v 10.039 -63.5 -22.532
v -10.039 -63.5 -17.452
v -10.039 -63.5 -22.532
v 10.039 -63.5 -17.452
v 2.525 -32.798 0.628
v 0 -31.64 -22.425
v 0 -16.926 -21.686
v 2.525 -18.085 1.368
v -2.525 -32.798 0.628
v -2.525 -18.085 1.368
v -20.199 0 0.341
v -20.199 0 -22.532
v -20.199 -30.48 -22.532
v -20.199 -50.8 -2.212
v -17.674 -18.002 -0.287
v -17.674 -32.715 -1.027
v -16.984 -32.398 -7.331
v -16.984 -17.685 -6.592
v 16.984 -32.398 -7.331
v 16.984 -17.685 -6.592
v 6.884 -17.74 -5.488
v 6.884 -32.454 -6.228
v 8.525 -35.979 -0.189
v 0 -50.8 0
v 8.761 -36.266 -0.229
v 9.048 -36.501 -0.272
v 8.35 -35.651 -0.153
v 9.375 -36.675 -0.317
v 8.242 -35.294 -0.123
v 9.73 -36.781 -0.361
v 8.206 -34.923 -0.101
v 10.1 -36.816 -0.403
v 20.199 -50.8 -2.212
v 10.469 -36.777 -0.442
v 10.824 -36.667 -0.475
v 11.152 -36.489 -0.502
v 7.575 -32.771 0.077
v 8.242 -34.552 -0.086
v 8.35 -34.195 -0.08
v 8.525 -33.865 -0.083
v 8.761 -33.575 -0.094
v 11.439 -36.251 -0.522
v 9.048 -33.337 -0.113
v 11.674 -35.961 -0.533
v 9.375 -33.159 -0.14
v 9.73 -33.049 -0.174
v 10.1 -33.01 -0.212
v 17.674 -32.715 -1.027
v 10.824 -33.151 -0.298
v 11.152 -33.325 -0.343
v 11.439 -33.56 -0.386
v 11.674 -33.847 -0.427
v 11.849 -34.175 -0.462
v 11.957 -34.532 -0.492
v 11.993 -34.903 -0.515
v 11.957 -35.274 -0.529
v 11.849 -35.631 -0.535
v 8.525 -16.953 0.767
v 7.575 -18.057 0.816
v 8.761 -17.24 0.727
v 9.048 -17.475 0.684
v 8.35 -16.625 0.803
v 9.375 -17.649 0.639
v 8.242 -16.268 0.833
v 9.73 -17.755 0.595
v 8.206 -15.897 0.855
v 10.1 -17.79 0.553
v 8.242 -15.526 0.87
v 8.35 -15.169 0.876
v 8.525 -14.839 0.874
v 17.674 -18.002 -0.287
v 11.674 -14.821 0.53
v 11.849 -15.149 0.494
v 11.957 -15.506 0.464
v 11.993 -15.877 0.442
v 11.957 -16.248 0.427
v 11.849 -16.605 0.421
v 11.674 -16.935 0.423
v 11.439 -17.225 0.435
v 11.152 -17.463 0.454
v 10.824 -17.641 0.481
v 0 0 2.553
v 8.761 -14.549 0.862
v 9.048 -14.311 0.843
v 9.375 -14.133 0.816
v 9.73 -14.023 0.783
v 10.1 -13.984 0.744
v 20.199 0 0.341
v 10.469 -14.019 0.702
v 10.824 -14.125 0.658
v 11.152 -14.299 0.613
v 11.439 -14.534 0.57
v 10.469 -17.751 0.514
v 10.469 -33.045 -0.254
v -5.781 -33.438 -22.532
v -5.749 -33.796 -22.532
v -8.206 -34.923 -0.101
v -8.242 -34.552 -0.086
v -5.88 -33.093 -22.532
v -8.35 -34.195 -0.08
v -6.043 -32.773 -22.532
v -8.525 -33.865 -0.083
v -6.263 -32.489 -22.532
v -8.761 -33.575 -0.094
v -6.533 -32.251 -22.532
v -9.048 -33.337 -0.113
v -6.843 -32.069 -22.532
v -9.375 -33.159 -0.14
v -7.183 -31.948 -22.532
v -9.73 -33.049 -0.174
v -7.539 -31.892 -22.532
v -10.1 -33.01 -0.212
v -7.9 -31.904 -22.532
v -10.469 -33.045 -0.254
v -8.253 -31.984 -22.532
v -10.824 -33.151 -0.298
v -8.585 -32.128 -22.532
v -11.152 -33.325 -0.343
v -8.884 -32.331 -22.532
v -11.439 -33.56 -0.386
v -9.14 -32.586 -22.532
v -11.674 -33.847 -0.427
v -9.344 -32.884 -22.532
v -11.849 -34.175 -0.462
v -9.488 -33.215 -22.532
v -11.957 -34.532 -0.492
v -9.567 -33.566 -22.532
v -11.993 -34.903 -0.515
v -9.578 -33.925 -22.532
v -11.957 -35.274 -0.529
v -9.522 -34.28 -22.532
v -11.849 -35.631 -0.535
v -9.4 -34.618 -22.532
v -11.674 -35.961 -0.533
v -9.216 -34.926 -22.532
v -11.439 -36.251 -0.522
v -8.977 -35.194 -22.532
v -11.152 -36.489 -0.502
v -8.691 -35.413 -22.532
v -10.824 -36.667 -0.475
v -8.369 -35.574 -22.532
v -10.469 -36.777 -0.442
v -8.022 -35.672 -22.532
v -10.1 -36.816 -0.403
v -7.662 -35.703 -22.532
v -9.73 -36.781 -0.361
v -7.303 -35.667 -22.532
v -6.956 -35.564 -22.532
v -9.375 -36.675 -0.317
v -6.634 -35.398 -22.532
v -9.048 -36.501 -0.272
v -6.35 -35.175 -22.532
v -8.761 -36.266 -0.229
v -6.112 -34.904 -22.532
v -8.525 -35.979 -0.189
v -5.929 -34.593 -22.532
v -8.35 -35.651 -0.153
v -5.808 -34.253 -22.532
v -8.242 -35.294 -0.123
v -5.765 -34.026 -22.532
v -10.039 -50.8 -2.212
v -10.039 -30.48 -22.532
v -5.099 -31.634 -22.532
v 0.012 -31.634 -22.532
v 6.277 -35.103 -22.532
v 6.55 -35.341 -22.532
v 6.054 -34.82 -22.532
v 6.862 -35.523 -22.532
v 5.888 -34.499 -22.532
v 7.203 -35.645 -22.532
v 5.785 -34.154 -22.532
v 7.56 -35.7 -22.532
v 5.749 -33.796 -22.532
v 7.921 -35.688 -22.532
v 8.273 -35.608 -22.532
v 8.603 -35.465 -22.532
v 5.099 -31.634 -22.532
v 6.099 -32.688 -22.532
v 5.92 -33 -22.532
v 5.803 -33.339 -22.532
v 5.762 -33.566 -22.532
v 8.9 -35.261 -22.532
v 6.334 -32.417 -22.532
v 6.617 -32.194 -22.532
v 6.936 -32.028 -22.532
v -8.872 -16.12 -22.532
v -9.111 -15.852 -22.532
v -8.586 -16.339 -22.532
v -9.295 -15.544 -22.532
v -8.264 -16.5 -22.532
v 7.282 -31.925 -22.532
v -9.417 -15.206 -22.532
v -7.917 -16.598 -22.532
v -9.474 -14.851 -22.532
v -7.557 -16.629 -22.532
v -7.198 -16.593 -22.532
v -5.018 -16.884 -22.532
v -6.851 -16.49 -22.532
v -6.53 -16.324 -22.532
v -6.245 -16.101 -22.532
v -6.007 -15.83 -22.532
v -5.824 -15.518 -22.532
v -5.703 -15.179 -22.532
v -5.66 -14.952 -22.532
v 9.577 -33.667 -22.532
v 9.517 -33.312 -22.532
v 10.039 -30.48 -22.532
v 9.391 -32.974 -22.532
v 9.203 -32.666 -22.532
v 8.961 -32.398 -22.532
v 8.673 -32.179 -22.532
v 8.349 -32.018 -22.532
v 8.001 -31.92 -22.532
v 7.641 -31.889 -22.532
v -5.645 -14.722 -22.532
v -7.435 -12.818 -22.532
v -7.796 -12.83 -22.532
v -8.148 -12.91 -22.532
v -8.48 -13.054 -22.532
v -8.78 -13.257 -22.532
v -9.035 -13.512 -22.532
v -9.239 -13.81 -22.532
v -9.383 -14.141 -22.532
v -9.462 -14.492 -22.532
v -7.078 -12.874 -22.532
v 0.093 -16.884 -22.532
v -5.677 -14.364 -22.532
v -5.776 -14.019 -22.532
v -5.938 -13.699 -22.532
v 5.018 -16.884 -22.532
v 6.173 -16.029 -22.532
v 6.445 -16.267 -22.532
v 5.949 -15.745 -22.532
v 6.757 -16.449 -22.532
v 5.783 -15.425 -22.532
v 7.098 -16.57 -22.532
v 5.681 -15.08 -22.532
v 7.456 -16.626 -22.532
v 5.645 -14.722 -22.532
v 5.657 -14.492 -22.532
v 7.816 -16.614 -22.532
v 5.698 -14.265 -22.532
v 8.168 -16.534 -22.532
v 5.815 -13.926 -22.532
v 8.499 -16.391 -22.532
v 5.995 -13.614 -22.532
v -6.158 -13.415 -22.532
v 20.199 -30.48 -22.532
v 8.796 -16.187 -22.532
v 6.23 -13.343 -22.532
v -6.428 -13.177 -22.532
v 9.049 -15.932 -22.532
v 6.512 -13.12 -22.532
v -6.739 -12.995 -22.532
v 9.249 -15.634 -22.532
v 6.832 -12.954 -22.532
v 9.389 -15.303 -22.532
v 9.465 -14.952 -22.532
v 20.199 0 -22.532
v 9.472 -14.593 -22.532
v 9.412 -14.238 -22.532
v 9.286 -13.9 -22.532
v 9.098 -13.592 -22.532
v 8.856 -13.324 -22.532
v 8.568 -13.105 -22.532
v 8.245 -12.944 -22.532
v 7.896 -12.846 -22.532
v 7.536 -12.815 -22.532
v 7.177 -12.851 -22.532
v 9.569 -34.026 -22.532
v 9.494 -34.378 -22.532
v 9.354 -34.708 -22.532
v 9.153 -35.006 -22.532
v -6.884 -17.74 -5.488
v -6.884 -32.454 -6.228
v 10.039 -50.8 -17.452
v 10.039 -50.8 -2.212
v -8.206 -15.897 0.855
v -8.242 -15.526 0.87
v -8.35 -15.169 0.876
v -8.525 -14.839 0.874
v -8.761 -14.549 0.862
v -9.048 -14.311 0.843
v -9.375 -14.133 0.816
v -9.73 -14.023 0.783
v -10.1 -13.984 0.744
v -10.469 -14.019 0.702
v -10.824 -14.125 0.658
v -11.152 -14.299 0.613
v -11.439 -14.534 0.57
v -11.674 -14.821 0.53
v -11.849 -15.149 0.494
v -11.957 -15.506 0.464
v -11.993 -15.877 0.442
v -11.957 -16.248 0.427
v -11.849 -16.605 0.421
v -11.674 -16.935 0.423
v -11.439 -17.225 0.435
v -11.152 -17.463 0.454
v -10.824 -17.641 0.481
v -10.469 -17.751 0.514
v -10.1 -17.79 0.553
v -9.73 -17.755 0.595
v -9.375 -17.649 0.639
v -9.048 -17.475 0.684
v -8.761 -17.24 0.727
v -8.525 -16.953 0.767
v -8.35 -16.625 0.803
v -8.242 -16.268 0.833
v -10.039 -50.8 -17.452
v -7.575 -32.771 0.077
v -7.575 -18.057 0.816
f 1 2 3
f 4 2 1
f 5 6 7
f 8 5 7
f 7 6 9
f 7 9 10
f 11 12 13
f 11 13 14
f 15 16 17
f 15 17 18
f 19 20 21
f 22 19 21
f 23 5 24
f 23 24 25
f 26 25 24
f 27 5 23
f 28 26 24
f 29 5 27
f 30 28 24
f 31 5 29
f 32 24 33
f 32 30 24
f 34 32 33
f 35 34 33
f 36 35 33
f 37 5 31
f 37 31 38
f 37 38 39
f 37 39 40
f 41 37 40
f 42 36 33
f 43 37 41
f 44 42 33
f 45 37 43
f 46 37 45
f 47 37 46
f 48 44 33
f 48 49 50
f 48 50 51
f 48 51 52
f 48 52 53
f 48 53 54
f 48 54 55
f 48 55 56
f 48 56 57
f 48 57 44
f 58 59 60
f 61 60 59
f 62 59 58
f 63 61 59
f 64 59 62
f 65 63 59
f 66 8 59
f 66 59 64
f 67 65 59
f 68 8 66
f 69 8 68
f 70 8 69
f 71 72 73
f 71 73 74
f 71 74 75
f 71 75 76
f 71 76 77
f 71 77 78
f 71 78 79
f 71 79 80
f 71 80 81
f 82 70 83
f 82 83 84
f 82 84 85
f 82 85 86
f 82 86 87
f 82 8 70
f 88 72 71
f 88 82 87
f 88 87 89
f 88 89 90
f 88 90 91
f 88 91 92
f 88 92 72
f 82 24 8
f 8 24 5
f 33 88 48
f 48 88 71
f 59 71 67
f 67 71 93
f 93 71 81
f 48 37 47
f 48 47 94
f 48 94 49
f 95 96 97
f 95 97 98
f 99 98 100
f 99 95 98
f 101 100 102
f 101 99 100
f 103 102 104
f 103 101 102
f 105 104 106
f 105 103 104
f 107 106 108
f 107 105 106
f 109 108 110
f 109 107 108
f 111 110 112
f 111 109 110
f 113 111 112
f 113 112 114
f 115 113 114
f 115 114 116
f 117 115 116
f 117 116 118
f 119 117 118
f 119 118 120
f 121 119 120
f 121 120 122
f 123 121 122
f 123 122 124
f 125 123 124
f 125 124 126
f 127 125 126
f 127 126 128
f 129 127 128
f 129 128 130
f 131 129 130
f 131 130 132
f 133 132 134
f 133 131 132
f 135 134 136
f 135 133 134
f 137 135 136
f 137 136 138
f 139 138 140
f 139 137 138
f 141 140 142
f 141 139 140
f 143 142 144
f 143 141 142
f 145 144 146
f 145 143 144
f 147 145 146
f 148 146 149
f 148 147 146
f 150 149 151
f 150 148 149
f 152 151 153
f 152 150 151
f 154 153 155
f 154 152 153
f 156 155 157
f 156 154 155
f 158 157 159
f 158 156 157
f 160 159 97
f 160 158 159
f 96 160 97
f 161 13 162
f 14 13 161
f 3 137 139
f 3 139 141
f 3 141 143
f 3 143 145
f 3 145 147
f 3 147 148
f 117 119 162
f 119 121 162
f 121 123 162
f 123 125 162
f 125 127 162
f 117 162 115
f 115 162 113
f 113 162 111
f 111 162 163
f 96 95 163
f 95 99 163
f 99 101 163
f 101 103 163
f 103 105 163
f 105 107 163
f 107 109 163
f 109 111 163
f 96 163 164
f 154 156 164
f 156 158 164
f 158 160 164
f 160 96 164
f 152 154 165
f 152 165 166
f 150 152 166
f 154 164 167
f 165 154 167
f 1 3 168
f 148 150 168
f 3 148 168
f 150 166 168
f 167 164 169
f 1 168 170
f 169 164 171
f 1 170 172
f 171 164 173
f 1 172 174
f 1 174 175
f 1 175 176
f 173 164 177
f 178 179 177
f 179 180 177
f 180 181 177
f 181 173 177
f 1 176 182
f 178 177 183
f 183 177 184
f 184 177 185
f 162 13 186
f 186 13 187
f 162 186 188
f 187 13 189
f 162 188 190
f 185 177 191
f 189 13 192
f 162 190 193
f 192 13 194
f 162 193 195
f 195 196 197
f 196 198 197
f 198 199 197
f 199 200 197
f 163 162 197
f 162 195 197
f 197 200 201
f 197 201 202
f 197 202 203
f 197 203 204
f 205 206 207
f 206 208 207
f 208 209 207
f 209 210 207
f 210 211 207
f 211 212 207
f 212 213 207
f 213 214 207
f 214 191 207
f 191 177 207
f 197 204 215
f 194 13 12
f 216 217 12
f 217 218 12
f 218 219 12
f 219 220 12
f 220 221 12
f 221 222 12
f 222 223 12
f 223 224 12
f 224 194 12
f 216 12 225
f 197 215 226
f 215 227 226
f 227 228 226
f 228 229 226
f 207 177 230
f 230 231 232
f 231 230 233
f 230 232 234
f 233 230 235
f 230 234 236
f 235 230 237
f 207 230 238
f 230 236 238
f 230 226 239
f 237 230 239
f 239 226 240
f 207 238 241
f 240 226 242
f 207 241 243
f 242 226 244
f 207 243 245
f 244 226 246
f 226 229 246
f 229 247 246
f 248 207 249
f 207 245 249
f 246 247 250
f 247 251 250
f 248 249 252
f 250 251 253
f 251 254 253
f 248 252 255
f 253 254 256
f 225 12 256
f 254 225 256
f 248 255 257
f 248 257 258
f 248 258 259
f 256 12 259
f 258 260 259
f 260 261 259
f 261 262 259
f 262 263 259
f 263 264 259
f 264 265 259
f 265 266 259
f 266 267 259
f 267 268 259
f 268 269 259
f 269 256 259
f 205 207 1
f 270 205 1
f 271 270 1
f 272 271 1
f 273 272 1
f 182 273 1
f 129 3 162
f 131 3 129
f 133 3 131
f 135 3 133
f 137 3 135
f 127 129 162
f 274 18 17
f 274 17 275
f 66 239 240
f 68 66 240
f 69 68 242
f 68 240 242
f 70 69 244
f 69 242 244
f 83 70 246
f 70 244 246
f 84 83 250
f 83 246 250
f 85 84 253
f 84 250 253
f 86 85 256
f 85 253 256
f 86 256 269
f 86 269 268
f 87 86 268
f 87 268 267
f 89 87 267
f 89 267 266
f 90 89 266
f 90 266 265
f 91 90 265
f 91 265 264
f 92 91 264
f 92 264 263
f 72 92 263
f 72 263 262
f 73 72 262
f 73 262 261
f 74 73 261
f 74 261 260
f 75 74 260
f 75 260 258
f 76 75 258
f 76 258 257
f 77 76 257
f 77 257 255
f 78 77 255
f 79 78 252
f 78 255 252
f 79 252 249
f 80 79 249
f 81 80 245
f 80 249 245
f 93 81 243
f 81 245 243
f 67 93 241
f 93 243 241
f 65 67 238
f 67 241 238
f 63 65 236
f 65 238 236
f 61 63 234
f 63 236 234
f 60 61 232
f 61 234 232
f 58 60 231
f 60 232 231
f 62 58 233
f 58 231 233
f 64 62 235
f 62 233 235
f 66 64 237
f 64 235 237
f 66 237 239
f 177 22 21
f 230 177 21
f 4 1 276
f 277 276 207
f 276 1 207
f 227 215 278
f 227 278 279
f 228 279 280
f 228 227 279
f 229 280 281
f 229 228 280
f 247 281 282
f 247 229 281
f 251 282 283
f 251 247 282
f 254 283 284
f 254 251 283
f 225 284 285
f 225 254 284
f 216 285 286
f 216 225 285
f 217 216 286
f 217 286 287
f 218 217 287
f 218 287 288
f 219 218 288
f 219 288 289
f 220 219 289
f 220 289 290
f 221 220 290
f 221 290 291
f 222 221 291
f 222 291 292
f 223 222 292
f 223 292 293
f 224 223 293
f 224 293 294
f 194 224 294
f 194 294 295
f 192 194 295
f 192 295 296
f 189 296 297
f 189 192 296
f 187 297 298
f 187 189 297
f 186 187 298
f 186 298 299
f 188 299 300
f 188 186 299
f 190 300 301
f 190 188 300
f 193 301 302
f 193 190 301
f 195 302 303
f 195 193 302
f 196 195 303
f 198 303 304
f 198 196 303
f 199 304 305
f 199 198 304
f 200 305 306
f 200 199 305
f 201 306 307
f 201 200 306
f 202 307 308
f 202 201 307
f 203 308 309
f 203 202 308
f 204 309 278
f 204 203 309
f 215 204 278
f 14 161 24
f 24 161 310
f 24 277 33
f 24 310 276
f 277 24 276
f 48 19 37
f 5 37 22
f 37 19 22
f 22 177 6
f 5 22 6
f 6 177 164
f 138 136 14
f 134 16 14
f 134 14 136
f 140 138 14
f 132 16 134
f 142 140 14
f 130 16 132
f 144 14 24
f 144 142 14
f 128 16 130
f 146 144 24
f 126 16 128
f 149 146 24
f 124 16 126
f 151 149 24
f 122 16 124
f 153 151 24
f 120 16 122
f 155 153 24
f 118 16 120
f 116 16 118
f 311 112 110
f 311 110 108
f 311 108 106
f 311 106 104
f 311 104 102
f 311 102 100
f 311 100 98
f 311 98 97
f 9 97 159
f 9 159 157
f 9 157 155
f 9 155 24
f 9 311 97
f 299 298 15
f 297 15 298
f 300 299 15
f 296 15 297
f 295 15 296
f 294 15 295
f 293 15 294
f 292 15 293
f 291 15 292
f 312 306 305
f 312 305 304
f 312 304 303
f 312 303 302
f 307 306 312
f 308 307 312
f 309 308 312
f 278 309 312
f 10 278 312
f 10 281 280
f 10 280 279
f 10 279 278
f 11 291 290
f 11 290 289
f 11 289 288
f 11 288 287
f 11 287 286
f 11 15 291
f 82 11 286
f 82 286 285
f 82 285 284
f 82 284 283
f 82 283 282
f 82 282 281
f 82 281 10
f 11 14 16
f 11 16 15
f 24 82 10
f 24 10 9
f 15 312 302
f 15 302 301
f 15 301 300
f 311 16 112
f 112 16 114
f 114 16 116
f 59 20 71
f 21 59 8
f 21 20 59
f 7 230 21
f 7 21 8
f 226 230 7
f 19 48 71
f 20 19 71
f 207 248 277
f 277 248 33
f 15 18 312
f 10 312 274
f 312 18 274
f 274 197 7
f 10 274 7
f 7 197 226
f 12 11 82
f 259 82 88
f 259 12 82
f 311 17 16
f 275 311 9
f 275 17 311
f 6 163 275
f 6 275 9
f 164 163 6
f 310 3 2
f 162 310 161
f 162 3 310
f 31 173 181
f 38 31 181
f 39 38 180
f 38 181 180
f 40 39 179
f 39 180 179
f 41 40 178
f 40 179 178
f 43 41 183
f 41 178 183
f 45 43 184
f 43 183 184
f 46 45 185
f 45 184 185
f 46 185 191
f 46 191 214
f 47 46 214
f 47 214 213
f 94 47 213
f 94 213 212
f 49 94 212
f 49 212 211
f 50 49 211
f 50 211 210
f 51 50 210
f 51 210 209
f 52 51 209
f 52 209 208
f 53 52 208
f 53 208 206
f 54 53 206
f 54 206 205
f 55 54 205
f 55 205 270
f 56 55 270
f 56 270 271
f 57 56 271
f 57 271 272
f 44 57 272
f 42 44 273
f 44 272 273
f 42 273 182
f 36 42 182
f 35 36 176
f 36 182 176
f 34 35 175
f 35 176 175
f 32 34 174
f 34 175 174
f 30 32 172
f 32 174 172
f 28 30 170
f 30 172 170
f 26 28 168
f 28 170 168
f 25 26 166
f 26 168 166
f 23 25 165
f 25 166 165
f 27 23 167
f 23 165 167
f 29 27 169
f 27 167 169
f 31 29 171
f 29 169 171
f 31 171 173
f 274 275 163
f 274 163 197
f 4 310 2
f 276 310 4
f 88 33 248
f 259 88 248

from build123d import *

# Parameters (mm, degrees)
BOSS_EXTRUDE1_DEPTH = 50.8
DRAFT1_ANGLE        = 2.86
CUT_EXTRUDE1_DEPTH  = 10.16
SKETCH3_W           = 20.078449586
SKETCH3_H           = 5.08
BOSS_EXTRUDE2_DEPTH = 12.7
CUT_EXTRUDE2_START  = -28.101341283
SKETCH4_R           = 1.905
SKETCH4_W           = 5.08
SKETCH4_H           = 14.732
CUT_EXTRUDE2_DEPTH  = 34.466005054
SKETCH5_W           = 15.24
SKETCH5_H           = 14.732
CUT_EXTRUDE3_DEPTH  = 6.35


with BuildPart() as part:
    # Sketch1 → Boss-Extrude1 (new body)
    with BuildSketch(Plane(origin=(0, 0, 0), x_dir=(1, 0, 0), z_dir=(0, 1, 0))):
        Polygon((-20.199224793, 2.212174897), (0, 0), (20.199224793, 2.212174897), (20.199224793, 22.532174897), (-20.199224793, 22.532174897), align=None)
    extrude(amount=-BOSS_EXTRUDE1_DEPTH)

    # Draft1
    draft1_faces = [part.faces().sort_by_distance(p)[0] for p in [
        (10.099612396, -25.4, -1.106087448),
        (-10.099612396, -25.4, -1.106087448),
    ]]
    draft(draft1_faces, Plane(origin=(0, -50.8, 0), x_dir=(0, 0, -1), z_dir=(0, -1, 0)), DRAFT1_ANGLE)

    # Sketch2 → Cut-Extrude1 (cut)
    with BuildSketch(Plane.ZY.offset(20.199224793)):
        Polygon((-22.532174897, -30.48), (-2.212174897, -50.8), (-22.532174897, -50.8), align=None)
    cut_extrude1 = extrude(amount=-CUT_EXTRUDE1_DEPTH, mode=Mode.SUBTRACT)

    # Mirror1: Cut-Extrude1 across plane
    add(cut_extrude1.mirror(Plane.ZY), mode=Mode.SUBTRACT)

    # Sketch3 → Boss-Extrude2 (add)
    with BuildSketch(Plane.XZ.offset(50.8)):
        with Locations((0, -19.992174897)):
            Rectangle(SKETCH3_W, SKETCH3_H)
    extrude(amount=BOSS_EXTRUDE2_DEPTH)

    # Sketch4 → Cut-Extrude2 (cut)
    with BuildSketch(Plane(origin=(-0.275601276, -0.126470659, 2.516497283), x_dir=(0.99407118, -0.005457579, 0.108594221), z_dir=(-0.108731274, -0.04989569, 0.992818176)).offset(CUT_EXTRUDE2_START)):
        with Locations((-9.882603301, -15.834429405)):
            Circle(SKETCH4_R)
        with Locations((-9.882603301, -34.884429405)):
            Circle(SKETCH4_R)
        with Locations((-4.802603301, -25.359429405)):
            Rectangle(SKETCH4_W, SKETCH4_H)
    cut_extrude2 = extrude(amount=CUT_EXTRUDE2_DEPTH, mode=Mode.SUBTRACT)

    # Sketch5 → Cut-Extrude3 (cut)
    with BuildSketch(Plane(origin=(-0.275601276, -0.126470659, 2.516497283), x_dir=(0.99407118, -0.005457579, 0.108594221), z_dir=(-0.108731274, -0.04989569, 0.992818176))):
        with Locations((-9.882603301, -25.359429405)):
            Rectangle(SKETCH5_W, SKETCH5_H)
    cut_extrude3 = extrude(amount=-CUT_EXTRUDE3_DEPTH, mode=Mode.SUBTRACT)

    # Mirror2: Cut-Extrude2, Cut-Extrude3 across plane
    add(cut_extrude2.mirror(Plane.ZY), mode=Mode.SUBTRACT)
    add(cut_extrude3.mirror(Plane.ZY), mode=Mode.SUBTRACT)


solid = part.part
